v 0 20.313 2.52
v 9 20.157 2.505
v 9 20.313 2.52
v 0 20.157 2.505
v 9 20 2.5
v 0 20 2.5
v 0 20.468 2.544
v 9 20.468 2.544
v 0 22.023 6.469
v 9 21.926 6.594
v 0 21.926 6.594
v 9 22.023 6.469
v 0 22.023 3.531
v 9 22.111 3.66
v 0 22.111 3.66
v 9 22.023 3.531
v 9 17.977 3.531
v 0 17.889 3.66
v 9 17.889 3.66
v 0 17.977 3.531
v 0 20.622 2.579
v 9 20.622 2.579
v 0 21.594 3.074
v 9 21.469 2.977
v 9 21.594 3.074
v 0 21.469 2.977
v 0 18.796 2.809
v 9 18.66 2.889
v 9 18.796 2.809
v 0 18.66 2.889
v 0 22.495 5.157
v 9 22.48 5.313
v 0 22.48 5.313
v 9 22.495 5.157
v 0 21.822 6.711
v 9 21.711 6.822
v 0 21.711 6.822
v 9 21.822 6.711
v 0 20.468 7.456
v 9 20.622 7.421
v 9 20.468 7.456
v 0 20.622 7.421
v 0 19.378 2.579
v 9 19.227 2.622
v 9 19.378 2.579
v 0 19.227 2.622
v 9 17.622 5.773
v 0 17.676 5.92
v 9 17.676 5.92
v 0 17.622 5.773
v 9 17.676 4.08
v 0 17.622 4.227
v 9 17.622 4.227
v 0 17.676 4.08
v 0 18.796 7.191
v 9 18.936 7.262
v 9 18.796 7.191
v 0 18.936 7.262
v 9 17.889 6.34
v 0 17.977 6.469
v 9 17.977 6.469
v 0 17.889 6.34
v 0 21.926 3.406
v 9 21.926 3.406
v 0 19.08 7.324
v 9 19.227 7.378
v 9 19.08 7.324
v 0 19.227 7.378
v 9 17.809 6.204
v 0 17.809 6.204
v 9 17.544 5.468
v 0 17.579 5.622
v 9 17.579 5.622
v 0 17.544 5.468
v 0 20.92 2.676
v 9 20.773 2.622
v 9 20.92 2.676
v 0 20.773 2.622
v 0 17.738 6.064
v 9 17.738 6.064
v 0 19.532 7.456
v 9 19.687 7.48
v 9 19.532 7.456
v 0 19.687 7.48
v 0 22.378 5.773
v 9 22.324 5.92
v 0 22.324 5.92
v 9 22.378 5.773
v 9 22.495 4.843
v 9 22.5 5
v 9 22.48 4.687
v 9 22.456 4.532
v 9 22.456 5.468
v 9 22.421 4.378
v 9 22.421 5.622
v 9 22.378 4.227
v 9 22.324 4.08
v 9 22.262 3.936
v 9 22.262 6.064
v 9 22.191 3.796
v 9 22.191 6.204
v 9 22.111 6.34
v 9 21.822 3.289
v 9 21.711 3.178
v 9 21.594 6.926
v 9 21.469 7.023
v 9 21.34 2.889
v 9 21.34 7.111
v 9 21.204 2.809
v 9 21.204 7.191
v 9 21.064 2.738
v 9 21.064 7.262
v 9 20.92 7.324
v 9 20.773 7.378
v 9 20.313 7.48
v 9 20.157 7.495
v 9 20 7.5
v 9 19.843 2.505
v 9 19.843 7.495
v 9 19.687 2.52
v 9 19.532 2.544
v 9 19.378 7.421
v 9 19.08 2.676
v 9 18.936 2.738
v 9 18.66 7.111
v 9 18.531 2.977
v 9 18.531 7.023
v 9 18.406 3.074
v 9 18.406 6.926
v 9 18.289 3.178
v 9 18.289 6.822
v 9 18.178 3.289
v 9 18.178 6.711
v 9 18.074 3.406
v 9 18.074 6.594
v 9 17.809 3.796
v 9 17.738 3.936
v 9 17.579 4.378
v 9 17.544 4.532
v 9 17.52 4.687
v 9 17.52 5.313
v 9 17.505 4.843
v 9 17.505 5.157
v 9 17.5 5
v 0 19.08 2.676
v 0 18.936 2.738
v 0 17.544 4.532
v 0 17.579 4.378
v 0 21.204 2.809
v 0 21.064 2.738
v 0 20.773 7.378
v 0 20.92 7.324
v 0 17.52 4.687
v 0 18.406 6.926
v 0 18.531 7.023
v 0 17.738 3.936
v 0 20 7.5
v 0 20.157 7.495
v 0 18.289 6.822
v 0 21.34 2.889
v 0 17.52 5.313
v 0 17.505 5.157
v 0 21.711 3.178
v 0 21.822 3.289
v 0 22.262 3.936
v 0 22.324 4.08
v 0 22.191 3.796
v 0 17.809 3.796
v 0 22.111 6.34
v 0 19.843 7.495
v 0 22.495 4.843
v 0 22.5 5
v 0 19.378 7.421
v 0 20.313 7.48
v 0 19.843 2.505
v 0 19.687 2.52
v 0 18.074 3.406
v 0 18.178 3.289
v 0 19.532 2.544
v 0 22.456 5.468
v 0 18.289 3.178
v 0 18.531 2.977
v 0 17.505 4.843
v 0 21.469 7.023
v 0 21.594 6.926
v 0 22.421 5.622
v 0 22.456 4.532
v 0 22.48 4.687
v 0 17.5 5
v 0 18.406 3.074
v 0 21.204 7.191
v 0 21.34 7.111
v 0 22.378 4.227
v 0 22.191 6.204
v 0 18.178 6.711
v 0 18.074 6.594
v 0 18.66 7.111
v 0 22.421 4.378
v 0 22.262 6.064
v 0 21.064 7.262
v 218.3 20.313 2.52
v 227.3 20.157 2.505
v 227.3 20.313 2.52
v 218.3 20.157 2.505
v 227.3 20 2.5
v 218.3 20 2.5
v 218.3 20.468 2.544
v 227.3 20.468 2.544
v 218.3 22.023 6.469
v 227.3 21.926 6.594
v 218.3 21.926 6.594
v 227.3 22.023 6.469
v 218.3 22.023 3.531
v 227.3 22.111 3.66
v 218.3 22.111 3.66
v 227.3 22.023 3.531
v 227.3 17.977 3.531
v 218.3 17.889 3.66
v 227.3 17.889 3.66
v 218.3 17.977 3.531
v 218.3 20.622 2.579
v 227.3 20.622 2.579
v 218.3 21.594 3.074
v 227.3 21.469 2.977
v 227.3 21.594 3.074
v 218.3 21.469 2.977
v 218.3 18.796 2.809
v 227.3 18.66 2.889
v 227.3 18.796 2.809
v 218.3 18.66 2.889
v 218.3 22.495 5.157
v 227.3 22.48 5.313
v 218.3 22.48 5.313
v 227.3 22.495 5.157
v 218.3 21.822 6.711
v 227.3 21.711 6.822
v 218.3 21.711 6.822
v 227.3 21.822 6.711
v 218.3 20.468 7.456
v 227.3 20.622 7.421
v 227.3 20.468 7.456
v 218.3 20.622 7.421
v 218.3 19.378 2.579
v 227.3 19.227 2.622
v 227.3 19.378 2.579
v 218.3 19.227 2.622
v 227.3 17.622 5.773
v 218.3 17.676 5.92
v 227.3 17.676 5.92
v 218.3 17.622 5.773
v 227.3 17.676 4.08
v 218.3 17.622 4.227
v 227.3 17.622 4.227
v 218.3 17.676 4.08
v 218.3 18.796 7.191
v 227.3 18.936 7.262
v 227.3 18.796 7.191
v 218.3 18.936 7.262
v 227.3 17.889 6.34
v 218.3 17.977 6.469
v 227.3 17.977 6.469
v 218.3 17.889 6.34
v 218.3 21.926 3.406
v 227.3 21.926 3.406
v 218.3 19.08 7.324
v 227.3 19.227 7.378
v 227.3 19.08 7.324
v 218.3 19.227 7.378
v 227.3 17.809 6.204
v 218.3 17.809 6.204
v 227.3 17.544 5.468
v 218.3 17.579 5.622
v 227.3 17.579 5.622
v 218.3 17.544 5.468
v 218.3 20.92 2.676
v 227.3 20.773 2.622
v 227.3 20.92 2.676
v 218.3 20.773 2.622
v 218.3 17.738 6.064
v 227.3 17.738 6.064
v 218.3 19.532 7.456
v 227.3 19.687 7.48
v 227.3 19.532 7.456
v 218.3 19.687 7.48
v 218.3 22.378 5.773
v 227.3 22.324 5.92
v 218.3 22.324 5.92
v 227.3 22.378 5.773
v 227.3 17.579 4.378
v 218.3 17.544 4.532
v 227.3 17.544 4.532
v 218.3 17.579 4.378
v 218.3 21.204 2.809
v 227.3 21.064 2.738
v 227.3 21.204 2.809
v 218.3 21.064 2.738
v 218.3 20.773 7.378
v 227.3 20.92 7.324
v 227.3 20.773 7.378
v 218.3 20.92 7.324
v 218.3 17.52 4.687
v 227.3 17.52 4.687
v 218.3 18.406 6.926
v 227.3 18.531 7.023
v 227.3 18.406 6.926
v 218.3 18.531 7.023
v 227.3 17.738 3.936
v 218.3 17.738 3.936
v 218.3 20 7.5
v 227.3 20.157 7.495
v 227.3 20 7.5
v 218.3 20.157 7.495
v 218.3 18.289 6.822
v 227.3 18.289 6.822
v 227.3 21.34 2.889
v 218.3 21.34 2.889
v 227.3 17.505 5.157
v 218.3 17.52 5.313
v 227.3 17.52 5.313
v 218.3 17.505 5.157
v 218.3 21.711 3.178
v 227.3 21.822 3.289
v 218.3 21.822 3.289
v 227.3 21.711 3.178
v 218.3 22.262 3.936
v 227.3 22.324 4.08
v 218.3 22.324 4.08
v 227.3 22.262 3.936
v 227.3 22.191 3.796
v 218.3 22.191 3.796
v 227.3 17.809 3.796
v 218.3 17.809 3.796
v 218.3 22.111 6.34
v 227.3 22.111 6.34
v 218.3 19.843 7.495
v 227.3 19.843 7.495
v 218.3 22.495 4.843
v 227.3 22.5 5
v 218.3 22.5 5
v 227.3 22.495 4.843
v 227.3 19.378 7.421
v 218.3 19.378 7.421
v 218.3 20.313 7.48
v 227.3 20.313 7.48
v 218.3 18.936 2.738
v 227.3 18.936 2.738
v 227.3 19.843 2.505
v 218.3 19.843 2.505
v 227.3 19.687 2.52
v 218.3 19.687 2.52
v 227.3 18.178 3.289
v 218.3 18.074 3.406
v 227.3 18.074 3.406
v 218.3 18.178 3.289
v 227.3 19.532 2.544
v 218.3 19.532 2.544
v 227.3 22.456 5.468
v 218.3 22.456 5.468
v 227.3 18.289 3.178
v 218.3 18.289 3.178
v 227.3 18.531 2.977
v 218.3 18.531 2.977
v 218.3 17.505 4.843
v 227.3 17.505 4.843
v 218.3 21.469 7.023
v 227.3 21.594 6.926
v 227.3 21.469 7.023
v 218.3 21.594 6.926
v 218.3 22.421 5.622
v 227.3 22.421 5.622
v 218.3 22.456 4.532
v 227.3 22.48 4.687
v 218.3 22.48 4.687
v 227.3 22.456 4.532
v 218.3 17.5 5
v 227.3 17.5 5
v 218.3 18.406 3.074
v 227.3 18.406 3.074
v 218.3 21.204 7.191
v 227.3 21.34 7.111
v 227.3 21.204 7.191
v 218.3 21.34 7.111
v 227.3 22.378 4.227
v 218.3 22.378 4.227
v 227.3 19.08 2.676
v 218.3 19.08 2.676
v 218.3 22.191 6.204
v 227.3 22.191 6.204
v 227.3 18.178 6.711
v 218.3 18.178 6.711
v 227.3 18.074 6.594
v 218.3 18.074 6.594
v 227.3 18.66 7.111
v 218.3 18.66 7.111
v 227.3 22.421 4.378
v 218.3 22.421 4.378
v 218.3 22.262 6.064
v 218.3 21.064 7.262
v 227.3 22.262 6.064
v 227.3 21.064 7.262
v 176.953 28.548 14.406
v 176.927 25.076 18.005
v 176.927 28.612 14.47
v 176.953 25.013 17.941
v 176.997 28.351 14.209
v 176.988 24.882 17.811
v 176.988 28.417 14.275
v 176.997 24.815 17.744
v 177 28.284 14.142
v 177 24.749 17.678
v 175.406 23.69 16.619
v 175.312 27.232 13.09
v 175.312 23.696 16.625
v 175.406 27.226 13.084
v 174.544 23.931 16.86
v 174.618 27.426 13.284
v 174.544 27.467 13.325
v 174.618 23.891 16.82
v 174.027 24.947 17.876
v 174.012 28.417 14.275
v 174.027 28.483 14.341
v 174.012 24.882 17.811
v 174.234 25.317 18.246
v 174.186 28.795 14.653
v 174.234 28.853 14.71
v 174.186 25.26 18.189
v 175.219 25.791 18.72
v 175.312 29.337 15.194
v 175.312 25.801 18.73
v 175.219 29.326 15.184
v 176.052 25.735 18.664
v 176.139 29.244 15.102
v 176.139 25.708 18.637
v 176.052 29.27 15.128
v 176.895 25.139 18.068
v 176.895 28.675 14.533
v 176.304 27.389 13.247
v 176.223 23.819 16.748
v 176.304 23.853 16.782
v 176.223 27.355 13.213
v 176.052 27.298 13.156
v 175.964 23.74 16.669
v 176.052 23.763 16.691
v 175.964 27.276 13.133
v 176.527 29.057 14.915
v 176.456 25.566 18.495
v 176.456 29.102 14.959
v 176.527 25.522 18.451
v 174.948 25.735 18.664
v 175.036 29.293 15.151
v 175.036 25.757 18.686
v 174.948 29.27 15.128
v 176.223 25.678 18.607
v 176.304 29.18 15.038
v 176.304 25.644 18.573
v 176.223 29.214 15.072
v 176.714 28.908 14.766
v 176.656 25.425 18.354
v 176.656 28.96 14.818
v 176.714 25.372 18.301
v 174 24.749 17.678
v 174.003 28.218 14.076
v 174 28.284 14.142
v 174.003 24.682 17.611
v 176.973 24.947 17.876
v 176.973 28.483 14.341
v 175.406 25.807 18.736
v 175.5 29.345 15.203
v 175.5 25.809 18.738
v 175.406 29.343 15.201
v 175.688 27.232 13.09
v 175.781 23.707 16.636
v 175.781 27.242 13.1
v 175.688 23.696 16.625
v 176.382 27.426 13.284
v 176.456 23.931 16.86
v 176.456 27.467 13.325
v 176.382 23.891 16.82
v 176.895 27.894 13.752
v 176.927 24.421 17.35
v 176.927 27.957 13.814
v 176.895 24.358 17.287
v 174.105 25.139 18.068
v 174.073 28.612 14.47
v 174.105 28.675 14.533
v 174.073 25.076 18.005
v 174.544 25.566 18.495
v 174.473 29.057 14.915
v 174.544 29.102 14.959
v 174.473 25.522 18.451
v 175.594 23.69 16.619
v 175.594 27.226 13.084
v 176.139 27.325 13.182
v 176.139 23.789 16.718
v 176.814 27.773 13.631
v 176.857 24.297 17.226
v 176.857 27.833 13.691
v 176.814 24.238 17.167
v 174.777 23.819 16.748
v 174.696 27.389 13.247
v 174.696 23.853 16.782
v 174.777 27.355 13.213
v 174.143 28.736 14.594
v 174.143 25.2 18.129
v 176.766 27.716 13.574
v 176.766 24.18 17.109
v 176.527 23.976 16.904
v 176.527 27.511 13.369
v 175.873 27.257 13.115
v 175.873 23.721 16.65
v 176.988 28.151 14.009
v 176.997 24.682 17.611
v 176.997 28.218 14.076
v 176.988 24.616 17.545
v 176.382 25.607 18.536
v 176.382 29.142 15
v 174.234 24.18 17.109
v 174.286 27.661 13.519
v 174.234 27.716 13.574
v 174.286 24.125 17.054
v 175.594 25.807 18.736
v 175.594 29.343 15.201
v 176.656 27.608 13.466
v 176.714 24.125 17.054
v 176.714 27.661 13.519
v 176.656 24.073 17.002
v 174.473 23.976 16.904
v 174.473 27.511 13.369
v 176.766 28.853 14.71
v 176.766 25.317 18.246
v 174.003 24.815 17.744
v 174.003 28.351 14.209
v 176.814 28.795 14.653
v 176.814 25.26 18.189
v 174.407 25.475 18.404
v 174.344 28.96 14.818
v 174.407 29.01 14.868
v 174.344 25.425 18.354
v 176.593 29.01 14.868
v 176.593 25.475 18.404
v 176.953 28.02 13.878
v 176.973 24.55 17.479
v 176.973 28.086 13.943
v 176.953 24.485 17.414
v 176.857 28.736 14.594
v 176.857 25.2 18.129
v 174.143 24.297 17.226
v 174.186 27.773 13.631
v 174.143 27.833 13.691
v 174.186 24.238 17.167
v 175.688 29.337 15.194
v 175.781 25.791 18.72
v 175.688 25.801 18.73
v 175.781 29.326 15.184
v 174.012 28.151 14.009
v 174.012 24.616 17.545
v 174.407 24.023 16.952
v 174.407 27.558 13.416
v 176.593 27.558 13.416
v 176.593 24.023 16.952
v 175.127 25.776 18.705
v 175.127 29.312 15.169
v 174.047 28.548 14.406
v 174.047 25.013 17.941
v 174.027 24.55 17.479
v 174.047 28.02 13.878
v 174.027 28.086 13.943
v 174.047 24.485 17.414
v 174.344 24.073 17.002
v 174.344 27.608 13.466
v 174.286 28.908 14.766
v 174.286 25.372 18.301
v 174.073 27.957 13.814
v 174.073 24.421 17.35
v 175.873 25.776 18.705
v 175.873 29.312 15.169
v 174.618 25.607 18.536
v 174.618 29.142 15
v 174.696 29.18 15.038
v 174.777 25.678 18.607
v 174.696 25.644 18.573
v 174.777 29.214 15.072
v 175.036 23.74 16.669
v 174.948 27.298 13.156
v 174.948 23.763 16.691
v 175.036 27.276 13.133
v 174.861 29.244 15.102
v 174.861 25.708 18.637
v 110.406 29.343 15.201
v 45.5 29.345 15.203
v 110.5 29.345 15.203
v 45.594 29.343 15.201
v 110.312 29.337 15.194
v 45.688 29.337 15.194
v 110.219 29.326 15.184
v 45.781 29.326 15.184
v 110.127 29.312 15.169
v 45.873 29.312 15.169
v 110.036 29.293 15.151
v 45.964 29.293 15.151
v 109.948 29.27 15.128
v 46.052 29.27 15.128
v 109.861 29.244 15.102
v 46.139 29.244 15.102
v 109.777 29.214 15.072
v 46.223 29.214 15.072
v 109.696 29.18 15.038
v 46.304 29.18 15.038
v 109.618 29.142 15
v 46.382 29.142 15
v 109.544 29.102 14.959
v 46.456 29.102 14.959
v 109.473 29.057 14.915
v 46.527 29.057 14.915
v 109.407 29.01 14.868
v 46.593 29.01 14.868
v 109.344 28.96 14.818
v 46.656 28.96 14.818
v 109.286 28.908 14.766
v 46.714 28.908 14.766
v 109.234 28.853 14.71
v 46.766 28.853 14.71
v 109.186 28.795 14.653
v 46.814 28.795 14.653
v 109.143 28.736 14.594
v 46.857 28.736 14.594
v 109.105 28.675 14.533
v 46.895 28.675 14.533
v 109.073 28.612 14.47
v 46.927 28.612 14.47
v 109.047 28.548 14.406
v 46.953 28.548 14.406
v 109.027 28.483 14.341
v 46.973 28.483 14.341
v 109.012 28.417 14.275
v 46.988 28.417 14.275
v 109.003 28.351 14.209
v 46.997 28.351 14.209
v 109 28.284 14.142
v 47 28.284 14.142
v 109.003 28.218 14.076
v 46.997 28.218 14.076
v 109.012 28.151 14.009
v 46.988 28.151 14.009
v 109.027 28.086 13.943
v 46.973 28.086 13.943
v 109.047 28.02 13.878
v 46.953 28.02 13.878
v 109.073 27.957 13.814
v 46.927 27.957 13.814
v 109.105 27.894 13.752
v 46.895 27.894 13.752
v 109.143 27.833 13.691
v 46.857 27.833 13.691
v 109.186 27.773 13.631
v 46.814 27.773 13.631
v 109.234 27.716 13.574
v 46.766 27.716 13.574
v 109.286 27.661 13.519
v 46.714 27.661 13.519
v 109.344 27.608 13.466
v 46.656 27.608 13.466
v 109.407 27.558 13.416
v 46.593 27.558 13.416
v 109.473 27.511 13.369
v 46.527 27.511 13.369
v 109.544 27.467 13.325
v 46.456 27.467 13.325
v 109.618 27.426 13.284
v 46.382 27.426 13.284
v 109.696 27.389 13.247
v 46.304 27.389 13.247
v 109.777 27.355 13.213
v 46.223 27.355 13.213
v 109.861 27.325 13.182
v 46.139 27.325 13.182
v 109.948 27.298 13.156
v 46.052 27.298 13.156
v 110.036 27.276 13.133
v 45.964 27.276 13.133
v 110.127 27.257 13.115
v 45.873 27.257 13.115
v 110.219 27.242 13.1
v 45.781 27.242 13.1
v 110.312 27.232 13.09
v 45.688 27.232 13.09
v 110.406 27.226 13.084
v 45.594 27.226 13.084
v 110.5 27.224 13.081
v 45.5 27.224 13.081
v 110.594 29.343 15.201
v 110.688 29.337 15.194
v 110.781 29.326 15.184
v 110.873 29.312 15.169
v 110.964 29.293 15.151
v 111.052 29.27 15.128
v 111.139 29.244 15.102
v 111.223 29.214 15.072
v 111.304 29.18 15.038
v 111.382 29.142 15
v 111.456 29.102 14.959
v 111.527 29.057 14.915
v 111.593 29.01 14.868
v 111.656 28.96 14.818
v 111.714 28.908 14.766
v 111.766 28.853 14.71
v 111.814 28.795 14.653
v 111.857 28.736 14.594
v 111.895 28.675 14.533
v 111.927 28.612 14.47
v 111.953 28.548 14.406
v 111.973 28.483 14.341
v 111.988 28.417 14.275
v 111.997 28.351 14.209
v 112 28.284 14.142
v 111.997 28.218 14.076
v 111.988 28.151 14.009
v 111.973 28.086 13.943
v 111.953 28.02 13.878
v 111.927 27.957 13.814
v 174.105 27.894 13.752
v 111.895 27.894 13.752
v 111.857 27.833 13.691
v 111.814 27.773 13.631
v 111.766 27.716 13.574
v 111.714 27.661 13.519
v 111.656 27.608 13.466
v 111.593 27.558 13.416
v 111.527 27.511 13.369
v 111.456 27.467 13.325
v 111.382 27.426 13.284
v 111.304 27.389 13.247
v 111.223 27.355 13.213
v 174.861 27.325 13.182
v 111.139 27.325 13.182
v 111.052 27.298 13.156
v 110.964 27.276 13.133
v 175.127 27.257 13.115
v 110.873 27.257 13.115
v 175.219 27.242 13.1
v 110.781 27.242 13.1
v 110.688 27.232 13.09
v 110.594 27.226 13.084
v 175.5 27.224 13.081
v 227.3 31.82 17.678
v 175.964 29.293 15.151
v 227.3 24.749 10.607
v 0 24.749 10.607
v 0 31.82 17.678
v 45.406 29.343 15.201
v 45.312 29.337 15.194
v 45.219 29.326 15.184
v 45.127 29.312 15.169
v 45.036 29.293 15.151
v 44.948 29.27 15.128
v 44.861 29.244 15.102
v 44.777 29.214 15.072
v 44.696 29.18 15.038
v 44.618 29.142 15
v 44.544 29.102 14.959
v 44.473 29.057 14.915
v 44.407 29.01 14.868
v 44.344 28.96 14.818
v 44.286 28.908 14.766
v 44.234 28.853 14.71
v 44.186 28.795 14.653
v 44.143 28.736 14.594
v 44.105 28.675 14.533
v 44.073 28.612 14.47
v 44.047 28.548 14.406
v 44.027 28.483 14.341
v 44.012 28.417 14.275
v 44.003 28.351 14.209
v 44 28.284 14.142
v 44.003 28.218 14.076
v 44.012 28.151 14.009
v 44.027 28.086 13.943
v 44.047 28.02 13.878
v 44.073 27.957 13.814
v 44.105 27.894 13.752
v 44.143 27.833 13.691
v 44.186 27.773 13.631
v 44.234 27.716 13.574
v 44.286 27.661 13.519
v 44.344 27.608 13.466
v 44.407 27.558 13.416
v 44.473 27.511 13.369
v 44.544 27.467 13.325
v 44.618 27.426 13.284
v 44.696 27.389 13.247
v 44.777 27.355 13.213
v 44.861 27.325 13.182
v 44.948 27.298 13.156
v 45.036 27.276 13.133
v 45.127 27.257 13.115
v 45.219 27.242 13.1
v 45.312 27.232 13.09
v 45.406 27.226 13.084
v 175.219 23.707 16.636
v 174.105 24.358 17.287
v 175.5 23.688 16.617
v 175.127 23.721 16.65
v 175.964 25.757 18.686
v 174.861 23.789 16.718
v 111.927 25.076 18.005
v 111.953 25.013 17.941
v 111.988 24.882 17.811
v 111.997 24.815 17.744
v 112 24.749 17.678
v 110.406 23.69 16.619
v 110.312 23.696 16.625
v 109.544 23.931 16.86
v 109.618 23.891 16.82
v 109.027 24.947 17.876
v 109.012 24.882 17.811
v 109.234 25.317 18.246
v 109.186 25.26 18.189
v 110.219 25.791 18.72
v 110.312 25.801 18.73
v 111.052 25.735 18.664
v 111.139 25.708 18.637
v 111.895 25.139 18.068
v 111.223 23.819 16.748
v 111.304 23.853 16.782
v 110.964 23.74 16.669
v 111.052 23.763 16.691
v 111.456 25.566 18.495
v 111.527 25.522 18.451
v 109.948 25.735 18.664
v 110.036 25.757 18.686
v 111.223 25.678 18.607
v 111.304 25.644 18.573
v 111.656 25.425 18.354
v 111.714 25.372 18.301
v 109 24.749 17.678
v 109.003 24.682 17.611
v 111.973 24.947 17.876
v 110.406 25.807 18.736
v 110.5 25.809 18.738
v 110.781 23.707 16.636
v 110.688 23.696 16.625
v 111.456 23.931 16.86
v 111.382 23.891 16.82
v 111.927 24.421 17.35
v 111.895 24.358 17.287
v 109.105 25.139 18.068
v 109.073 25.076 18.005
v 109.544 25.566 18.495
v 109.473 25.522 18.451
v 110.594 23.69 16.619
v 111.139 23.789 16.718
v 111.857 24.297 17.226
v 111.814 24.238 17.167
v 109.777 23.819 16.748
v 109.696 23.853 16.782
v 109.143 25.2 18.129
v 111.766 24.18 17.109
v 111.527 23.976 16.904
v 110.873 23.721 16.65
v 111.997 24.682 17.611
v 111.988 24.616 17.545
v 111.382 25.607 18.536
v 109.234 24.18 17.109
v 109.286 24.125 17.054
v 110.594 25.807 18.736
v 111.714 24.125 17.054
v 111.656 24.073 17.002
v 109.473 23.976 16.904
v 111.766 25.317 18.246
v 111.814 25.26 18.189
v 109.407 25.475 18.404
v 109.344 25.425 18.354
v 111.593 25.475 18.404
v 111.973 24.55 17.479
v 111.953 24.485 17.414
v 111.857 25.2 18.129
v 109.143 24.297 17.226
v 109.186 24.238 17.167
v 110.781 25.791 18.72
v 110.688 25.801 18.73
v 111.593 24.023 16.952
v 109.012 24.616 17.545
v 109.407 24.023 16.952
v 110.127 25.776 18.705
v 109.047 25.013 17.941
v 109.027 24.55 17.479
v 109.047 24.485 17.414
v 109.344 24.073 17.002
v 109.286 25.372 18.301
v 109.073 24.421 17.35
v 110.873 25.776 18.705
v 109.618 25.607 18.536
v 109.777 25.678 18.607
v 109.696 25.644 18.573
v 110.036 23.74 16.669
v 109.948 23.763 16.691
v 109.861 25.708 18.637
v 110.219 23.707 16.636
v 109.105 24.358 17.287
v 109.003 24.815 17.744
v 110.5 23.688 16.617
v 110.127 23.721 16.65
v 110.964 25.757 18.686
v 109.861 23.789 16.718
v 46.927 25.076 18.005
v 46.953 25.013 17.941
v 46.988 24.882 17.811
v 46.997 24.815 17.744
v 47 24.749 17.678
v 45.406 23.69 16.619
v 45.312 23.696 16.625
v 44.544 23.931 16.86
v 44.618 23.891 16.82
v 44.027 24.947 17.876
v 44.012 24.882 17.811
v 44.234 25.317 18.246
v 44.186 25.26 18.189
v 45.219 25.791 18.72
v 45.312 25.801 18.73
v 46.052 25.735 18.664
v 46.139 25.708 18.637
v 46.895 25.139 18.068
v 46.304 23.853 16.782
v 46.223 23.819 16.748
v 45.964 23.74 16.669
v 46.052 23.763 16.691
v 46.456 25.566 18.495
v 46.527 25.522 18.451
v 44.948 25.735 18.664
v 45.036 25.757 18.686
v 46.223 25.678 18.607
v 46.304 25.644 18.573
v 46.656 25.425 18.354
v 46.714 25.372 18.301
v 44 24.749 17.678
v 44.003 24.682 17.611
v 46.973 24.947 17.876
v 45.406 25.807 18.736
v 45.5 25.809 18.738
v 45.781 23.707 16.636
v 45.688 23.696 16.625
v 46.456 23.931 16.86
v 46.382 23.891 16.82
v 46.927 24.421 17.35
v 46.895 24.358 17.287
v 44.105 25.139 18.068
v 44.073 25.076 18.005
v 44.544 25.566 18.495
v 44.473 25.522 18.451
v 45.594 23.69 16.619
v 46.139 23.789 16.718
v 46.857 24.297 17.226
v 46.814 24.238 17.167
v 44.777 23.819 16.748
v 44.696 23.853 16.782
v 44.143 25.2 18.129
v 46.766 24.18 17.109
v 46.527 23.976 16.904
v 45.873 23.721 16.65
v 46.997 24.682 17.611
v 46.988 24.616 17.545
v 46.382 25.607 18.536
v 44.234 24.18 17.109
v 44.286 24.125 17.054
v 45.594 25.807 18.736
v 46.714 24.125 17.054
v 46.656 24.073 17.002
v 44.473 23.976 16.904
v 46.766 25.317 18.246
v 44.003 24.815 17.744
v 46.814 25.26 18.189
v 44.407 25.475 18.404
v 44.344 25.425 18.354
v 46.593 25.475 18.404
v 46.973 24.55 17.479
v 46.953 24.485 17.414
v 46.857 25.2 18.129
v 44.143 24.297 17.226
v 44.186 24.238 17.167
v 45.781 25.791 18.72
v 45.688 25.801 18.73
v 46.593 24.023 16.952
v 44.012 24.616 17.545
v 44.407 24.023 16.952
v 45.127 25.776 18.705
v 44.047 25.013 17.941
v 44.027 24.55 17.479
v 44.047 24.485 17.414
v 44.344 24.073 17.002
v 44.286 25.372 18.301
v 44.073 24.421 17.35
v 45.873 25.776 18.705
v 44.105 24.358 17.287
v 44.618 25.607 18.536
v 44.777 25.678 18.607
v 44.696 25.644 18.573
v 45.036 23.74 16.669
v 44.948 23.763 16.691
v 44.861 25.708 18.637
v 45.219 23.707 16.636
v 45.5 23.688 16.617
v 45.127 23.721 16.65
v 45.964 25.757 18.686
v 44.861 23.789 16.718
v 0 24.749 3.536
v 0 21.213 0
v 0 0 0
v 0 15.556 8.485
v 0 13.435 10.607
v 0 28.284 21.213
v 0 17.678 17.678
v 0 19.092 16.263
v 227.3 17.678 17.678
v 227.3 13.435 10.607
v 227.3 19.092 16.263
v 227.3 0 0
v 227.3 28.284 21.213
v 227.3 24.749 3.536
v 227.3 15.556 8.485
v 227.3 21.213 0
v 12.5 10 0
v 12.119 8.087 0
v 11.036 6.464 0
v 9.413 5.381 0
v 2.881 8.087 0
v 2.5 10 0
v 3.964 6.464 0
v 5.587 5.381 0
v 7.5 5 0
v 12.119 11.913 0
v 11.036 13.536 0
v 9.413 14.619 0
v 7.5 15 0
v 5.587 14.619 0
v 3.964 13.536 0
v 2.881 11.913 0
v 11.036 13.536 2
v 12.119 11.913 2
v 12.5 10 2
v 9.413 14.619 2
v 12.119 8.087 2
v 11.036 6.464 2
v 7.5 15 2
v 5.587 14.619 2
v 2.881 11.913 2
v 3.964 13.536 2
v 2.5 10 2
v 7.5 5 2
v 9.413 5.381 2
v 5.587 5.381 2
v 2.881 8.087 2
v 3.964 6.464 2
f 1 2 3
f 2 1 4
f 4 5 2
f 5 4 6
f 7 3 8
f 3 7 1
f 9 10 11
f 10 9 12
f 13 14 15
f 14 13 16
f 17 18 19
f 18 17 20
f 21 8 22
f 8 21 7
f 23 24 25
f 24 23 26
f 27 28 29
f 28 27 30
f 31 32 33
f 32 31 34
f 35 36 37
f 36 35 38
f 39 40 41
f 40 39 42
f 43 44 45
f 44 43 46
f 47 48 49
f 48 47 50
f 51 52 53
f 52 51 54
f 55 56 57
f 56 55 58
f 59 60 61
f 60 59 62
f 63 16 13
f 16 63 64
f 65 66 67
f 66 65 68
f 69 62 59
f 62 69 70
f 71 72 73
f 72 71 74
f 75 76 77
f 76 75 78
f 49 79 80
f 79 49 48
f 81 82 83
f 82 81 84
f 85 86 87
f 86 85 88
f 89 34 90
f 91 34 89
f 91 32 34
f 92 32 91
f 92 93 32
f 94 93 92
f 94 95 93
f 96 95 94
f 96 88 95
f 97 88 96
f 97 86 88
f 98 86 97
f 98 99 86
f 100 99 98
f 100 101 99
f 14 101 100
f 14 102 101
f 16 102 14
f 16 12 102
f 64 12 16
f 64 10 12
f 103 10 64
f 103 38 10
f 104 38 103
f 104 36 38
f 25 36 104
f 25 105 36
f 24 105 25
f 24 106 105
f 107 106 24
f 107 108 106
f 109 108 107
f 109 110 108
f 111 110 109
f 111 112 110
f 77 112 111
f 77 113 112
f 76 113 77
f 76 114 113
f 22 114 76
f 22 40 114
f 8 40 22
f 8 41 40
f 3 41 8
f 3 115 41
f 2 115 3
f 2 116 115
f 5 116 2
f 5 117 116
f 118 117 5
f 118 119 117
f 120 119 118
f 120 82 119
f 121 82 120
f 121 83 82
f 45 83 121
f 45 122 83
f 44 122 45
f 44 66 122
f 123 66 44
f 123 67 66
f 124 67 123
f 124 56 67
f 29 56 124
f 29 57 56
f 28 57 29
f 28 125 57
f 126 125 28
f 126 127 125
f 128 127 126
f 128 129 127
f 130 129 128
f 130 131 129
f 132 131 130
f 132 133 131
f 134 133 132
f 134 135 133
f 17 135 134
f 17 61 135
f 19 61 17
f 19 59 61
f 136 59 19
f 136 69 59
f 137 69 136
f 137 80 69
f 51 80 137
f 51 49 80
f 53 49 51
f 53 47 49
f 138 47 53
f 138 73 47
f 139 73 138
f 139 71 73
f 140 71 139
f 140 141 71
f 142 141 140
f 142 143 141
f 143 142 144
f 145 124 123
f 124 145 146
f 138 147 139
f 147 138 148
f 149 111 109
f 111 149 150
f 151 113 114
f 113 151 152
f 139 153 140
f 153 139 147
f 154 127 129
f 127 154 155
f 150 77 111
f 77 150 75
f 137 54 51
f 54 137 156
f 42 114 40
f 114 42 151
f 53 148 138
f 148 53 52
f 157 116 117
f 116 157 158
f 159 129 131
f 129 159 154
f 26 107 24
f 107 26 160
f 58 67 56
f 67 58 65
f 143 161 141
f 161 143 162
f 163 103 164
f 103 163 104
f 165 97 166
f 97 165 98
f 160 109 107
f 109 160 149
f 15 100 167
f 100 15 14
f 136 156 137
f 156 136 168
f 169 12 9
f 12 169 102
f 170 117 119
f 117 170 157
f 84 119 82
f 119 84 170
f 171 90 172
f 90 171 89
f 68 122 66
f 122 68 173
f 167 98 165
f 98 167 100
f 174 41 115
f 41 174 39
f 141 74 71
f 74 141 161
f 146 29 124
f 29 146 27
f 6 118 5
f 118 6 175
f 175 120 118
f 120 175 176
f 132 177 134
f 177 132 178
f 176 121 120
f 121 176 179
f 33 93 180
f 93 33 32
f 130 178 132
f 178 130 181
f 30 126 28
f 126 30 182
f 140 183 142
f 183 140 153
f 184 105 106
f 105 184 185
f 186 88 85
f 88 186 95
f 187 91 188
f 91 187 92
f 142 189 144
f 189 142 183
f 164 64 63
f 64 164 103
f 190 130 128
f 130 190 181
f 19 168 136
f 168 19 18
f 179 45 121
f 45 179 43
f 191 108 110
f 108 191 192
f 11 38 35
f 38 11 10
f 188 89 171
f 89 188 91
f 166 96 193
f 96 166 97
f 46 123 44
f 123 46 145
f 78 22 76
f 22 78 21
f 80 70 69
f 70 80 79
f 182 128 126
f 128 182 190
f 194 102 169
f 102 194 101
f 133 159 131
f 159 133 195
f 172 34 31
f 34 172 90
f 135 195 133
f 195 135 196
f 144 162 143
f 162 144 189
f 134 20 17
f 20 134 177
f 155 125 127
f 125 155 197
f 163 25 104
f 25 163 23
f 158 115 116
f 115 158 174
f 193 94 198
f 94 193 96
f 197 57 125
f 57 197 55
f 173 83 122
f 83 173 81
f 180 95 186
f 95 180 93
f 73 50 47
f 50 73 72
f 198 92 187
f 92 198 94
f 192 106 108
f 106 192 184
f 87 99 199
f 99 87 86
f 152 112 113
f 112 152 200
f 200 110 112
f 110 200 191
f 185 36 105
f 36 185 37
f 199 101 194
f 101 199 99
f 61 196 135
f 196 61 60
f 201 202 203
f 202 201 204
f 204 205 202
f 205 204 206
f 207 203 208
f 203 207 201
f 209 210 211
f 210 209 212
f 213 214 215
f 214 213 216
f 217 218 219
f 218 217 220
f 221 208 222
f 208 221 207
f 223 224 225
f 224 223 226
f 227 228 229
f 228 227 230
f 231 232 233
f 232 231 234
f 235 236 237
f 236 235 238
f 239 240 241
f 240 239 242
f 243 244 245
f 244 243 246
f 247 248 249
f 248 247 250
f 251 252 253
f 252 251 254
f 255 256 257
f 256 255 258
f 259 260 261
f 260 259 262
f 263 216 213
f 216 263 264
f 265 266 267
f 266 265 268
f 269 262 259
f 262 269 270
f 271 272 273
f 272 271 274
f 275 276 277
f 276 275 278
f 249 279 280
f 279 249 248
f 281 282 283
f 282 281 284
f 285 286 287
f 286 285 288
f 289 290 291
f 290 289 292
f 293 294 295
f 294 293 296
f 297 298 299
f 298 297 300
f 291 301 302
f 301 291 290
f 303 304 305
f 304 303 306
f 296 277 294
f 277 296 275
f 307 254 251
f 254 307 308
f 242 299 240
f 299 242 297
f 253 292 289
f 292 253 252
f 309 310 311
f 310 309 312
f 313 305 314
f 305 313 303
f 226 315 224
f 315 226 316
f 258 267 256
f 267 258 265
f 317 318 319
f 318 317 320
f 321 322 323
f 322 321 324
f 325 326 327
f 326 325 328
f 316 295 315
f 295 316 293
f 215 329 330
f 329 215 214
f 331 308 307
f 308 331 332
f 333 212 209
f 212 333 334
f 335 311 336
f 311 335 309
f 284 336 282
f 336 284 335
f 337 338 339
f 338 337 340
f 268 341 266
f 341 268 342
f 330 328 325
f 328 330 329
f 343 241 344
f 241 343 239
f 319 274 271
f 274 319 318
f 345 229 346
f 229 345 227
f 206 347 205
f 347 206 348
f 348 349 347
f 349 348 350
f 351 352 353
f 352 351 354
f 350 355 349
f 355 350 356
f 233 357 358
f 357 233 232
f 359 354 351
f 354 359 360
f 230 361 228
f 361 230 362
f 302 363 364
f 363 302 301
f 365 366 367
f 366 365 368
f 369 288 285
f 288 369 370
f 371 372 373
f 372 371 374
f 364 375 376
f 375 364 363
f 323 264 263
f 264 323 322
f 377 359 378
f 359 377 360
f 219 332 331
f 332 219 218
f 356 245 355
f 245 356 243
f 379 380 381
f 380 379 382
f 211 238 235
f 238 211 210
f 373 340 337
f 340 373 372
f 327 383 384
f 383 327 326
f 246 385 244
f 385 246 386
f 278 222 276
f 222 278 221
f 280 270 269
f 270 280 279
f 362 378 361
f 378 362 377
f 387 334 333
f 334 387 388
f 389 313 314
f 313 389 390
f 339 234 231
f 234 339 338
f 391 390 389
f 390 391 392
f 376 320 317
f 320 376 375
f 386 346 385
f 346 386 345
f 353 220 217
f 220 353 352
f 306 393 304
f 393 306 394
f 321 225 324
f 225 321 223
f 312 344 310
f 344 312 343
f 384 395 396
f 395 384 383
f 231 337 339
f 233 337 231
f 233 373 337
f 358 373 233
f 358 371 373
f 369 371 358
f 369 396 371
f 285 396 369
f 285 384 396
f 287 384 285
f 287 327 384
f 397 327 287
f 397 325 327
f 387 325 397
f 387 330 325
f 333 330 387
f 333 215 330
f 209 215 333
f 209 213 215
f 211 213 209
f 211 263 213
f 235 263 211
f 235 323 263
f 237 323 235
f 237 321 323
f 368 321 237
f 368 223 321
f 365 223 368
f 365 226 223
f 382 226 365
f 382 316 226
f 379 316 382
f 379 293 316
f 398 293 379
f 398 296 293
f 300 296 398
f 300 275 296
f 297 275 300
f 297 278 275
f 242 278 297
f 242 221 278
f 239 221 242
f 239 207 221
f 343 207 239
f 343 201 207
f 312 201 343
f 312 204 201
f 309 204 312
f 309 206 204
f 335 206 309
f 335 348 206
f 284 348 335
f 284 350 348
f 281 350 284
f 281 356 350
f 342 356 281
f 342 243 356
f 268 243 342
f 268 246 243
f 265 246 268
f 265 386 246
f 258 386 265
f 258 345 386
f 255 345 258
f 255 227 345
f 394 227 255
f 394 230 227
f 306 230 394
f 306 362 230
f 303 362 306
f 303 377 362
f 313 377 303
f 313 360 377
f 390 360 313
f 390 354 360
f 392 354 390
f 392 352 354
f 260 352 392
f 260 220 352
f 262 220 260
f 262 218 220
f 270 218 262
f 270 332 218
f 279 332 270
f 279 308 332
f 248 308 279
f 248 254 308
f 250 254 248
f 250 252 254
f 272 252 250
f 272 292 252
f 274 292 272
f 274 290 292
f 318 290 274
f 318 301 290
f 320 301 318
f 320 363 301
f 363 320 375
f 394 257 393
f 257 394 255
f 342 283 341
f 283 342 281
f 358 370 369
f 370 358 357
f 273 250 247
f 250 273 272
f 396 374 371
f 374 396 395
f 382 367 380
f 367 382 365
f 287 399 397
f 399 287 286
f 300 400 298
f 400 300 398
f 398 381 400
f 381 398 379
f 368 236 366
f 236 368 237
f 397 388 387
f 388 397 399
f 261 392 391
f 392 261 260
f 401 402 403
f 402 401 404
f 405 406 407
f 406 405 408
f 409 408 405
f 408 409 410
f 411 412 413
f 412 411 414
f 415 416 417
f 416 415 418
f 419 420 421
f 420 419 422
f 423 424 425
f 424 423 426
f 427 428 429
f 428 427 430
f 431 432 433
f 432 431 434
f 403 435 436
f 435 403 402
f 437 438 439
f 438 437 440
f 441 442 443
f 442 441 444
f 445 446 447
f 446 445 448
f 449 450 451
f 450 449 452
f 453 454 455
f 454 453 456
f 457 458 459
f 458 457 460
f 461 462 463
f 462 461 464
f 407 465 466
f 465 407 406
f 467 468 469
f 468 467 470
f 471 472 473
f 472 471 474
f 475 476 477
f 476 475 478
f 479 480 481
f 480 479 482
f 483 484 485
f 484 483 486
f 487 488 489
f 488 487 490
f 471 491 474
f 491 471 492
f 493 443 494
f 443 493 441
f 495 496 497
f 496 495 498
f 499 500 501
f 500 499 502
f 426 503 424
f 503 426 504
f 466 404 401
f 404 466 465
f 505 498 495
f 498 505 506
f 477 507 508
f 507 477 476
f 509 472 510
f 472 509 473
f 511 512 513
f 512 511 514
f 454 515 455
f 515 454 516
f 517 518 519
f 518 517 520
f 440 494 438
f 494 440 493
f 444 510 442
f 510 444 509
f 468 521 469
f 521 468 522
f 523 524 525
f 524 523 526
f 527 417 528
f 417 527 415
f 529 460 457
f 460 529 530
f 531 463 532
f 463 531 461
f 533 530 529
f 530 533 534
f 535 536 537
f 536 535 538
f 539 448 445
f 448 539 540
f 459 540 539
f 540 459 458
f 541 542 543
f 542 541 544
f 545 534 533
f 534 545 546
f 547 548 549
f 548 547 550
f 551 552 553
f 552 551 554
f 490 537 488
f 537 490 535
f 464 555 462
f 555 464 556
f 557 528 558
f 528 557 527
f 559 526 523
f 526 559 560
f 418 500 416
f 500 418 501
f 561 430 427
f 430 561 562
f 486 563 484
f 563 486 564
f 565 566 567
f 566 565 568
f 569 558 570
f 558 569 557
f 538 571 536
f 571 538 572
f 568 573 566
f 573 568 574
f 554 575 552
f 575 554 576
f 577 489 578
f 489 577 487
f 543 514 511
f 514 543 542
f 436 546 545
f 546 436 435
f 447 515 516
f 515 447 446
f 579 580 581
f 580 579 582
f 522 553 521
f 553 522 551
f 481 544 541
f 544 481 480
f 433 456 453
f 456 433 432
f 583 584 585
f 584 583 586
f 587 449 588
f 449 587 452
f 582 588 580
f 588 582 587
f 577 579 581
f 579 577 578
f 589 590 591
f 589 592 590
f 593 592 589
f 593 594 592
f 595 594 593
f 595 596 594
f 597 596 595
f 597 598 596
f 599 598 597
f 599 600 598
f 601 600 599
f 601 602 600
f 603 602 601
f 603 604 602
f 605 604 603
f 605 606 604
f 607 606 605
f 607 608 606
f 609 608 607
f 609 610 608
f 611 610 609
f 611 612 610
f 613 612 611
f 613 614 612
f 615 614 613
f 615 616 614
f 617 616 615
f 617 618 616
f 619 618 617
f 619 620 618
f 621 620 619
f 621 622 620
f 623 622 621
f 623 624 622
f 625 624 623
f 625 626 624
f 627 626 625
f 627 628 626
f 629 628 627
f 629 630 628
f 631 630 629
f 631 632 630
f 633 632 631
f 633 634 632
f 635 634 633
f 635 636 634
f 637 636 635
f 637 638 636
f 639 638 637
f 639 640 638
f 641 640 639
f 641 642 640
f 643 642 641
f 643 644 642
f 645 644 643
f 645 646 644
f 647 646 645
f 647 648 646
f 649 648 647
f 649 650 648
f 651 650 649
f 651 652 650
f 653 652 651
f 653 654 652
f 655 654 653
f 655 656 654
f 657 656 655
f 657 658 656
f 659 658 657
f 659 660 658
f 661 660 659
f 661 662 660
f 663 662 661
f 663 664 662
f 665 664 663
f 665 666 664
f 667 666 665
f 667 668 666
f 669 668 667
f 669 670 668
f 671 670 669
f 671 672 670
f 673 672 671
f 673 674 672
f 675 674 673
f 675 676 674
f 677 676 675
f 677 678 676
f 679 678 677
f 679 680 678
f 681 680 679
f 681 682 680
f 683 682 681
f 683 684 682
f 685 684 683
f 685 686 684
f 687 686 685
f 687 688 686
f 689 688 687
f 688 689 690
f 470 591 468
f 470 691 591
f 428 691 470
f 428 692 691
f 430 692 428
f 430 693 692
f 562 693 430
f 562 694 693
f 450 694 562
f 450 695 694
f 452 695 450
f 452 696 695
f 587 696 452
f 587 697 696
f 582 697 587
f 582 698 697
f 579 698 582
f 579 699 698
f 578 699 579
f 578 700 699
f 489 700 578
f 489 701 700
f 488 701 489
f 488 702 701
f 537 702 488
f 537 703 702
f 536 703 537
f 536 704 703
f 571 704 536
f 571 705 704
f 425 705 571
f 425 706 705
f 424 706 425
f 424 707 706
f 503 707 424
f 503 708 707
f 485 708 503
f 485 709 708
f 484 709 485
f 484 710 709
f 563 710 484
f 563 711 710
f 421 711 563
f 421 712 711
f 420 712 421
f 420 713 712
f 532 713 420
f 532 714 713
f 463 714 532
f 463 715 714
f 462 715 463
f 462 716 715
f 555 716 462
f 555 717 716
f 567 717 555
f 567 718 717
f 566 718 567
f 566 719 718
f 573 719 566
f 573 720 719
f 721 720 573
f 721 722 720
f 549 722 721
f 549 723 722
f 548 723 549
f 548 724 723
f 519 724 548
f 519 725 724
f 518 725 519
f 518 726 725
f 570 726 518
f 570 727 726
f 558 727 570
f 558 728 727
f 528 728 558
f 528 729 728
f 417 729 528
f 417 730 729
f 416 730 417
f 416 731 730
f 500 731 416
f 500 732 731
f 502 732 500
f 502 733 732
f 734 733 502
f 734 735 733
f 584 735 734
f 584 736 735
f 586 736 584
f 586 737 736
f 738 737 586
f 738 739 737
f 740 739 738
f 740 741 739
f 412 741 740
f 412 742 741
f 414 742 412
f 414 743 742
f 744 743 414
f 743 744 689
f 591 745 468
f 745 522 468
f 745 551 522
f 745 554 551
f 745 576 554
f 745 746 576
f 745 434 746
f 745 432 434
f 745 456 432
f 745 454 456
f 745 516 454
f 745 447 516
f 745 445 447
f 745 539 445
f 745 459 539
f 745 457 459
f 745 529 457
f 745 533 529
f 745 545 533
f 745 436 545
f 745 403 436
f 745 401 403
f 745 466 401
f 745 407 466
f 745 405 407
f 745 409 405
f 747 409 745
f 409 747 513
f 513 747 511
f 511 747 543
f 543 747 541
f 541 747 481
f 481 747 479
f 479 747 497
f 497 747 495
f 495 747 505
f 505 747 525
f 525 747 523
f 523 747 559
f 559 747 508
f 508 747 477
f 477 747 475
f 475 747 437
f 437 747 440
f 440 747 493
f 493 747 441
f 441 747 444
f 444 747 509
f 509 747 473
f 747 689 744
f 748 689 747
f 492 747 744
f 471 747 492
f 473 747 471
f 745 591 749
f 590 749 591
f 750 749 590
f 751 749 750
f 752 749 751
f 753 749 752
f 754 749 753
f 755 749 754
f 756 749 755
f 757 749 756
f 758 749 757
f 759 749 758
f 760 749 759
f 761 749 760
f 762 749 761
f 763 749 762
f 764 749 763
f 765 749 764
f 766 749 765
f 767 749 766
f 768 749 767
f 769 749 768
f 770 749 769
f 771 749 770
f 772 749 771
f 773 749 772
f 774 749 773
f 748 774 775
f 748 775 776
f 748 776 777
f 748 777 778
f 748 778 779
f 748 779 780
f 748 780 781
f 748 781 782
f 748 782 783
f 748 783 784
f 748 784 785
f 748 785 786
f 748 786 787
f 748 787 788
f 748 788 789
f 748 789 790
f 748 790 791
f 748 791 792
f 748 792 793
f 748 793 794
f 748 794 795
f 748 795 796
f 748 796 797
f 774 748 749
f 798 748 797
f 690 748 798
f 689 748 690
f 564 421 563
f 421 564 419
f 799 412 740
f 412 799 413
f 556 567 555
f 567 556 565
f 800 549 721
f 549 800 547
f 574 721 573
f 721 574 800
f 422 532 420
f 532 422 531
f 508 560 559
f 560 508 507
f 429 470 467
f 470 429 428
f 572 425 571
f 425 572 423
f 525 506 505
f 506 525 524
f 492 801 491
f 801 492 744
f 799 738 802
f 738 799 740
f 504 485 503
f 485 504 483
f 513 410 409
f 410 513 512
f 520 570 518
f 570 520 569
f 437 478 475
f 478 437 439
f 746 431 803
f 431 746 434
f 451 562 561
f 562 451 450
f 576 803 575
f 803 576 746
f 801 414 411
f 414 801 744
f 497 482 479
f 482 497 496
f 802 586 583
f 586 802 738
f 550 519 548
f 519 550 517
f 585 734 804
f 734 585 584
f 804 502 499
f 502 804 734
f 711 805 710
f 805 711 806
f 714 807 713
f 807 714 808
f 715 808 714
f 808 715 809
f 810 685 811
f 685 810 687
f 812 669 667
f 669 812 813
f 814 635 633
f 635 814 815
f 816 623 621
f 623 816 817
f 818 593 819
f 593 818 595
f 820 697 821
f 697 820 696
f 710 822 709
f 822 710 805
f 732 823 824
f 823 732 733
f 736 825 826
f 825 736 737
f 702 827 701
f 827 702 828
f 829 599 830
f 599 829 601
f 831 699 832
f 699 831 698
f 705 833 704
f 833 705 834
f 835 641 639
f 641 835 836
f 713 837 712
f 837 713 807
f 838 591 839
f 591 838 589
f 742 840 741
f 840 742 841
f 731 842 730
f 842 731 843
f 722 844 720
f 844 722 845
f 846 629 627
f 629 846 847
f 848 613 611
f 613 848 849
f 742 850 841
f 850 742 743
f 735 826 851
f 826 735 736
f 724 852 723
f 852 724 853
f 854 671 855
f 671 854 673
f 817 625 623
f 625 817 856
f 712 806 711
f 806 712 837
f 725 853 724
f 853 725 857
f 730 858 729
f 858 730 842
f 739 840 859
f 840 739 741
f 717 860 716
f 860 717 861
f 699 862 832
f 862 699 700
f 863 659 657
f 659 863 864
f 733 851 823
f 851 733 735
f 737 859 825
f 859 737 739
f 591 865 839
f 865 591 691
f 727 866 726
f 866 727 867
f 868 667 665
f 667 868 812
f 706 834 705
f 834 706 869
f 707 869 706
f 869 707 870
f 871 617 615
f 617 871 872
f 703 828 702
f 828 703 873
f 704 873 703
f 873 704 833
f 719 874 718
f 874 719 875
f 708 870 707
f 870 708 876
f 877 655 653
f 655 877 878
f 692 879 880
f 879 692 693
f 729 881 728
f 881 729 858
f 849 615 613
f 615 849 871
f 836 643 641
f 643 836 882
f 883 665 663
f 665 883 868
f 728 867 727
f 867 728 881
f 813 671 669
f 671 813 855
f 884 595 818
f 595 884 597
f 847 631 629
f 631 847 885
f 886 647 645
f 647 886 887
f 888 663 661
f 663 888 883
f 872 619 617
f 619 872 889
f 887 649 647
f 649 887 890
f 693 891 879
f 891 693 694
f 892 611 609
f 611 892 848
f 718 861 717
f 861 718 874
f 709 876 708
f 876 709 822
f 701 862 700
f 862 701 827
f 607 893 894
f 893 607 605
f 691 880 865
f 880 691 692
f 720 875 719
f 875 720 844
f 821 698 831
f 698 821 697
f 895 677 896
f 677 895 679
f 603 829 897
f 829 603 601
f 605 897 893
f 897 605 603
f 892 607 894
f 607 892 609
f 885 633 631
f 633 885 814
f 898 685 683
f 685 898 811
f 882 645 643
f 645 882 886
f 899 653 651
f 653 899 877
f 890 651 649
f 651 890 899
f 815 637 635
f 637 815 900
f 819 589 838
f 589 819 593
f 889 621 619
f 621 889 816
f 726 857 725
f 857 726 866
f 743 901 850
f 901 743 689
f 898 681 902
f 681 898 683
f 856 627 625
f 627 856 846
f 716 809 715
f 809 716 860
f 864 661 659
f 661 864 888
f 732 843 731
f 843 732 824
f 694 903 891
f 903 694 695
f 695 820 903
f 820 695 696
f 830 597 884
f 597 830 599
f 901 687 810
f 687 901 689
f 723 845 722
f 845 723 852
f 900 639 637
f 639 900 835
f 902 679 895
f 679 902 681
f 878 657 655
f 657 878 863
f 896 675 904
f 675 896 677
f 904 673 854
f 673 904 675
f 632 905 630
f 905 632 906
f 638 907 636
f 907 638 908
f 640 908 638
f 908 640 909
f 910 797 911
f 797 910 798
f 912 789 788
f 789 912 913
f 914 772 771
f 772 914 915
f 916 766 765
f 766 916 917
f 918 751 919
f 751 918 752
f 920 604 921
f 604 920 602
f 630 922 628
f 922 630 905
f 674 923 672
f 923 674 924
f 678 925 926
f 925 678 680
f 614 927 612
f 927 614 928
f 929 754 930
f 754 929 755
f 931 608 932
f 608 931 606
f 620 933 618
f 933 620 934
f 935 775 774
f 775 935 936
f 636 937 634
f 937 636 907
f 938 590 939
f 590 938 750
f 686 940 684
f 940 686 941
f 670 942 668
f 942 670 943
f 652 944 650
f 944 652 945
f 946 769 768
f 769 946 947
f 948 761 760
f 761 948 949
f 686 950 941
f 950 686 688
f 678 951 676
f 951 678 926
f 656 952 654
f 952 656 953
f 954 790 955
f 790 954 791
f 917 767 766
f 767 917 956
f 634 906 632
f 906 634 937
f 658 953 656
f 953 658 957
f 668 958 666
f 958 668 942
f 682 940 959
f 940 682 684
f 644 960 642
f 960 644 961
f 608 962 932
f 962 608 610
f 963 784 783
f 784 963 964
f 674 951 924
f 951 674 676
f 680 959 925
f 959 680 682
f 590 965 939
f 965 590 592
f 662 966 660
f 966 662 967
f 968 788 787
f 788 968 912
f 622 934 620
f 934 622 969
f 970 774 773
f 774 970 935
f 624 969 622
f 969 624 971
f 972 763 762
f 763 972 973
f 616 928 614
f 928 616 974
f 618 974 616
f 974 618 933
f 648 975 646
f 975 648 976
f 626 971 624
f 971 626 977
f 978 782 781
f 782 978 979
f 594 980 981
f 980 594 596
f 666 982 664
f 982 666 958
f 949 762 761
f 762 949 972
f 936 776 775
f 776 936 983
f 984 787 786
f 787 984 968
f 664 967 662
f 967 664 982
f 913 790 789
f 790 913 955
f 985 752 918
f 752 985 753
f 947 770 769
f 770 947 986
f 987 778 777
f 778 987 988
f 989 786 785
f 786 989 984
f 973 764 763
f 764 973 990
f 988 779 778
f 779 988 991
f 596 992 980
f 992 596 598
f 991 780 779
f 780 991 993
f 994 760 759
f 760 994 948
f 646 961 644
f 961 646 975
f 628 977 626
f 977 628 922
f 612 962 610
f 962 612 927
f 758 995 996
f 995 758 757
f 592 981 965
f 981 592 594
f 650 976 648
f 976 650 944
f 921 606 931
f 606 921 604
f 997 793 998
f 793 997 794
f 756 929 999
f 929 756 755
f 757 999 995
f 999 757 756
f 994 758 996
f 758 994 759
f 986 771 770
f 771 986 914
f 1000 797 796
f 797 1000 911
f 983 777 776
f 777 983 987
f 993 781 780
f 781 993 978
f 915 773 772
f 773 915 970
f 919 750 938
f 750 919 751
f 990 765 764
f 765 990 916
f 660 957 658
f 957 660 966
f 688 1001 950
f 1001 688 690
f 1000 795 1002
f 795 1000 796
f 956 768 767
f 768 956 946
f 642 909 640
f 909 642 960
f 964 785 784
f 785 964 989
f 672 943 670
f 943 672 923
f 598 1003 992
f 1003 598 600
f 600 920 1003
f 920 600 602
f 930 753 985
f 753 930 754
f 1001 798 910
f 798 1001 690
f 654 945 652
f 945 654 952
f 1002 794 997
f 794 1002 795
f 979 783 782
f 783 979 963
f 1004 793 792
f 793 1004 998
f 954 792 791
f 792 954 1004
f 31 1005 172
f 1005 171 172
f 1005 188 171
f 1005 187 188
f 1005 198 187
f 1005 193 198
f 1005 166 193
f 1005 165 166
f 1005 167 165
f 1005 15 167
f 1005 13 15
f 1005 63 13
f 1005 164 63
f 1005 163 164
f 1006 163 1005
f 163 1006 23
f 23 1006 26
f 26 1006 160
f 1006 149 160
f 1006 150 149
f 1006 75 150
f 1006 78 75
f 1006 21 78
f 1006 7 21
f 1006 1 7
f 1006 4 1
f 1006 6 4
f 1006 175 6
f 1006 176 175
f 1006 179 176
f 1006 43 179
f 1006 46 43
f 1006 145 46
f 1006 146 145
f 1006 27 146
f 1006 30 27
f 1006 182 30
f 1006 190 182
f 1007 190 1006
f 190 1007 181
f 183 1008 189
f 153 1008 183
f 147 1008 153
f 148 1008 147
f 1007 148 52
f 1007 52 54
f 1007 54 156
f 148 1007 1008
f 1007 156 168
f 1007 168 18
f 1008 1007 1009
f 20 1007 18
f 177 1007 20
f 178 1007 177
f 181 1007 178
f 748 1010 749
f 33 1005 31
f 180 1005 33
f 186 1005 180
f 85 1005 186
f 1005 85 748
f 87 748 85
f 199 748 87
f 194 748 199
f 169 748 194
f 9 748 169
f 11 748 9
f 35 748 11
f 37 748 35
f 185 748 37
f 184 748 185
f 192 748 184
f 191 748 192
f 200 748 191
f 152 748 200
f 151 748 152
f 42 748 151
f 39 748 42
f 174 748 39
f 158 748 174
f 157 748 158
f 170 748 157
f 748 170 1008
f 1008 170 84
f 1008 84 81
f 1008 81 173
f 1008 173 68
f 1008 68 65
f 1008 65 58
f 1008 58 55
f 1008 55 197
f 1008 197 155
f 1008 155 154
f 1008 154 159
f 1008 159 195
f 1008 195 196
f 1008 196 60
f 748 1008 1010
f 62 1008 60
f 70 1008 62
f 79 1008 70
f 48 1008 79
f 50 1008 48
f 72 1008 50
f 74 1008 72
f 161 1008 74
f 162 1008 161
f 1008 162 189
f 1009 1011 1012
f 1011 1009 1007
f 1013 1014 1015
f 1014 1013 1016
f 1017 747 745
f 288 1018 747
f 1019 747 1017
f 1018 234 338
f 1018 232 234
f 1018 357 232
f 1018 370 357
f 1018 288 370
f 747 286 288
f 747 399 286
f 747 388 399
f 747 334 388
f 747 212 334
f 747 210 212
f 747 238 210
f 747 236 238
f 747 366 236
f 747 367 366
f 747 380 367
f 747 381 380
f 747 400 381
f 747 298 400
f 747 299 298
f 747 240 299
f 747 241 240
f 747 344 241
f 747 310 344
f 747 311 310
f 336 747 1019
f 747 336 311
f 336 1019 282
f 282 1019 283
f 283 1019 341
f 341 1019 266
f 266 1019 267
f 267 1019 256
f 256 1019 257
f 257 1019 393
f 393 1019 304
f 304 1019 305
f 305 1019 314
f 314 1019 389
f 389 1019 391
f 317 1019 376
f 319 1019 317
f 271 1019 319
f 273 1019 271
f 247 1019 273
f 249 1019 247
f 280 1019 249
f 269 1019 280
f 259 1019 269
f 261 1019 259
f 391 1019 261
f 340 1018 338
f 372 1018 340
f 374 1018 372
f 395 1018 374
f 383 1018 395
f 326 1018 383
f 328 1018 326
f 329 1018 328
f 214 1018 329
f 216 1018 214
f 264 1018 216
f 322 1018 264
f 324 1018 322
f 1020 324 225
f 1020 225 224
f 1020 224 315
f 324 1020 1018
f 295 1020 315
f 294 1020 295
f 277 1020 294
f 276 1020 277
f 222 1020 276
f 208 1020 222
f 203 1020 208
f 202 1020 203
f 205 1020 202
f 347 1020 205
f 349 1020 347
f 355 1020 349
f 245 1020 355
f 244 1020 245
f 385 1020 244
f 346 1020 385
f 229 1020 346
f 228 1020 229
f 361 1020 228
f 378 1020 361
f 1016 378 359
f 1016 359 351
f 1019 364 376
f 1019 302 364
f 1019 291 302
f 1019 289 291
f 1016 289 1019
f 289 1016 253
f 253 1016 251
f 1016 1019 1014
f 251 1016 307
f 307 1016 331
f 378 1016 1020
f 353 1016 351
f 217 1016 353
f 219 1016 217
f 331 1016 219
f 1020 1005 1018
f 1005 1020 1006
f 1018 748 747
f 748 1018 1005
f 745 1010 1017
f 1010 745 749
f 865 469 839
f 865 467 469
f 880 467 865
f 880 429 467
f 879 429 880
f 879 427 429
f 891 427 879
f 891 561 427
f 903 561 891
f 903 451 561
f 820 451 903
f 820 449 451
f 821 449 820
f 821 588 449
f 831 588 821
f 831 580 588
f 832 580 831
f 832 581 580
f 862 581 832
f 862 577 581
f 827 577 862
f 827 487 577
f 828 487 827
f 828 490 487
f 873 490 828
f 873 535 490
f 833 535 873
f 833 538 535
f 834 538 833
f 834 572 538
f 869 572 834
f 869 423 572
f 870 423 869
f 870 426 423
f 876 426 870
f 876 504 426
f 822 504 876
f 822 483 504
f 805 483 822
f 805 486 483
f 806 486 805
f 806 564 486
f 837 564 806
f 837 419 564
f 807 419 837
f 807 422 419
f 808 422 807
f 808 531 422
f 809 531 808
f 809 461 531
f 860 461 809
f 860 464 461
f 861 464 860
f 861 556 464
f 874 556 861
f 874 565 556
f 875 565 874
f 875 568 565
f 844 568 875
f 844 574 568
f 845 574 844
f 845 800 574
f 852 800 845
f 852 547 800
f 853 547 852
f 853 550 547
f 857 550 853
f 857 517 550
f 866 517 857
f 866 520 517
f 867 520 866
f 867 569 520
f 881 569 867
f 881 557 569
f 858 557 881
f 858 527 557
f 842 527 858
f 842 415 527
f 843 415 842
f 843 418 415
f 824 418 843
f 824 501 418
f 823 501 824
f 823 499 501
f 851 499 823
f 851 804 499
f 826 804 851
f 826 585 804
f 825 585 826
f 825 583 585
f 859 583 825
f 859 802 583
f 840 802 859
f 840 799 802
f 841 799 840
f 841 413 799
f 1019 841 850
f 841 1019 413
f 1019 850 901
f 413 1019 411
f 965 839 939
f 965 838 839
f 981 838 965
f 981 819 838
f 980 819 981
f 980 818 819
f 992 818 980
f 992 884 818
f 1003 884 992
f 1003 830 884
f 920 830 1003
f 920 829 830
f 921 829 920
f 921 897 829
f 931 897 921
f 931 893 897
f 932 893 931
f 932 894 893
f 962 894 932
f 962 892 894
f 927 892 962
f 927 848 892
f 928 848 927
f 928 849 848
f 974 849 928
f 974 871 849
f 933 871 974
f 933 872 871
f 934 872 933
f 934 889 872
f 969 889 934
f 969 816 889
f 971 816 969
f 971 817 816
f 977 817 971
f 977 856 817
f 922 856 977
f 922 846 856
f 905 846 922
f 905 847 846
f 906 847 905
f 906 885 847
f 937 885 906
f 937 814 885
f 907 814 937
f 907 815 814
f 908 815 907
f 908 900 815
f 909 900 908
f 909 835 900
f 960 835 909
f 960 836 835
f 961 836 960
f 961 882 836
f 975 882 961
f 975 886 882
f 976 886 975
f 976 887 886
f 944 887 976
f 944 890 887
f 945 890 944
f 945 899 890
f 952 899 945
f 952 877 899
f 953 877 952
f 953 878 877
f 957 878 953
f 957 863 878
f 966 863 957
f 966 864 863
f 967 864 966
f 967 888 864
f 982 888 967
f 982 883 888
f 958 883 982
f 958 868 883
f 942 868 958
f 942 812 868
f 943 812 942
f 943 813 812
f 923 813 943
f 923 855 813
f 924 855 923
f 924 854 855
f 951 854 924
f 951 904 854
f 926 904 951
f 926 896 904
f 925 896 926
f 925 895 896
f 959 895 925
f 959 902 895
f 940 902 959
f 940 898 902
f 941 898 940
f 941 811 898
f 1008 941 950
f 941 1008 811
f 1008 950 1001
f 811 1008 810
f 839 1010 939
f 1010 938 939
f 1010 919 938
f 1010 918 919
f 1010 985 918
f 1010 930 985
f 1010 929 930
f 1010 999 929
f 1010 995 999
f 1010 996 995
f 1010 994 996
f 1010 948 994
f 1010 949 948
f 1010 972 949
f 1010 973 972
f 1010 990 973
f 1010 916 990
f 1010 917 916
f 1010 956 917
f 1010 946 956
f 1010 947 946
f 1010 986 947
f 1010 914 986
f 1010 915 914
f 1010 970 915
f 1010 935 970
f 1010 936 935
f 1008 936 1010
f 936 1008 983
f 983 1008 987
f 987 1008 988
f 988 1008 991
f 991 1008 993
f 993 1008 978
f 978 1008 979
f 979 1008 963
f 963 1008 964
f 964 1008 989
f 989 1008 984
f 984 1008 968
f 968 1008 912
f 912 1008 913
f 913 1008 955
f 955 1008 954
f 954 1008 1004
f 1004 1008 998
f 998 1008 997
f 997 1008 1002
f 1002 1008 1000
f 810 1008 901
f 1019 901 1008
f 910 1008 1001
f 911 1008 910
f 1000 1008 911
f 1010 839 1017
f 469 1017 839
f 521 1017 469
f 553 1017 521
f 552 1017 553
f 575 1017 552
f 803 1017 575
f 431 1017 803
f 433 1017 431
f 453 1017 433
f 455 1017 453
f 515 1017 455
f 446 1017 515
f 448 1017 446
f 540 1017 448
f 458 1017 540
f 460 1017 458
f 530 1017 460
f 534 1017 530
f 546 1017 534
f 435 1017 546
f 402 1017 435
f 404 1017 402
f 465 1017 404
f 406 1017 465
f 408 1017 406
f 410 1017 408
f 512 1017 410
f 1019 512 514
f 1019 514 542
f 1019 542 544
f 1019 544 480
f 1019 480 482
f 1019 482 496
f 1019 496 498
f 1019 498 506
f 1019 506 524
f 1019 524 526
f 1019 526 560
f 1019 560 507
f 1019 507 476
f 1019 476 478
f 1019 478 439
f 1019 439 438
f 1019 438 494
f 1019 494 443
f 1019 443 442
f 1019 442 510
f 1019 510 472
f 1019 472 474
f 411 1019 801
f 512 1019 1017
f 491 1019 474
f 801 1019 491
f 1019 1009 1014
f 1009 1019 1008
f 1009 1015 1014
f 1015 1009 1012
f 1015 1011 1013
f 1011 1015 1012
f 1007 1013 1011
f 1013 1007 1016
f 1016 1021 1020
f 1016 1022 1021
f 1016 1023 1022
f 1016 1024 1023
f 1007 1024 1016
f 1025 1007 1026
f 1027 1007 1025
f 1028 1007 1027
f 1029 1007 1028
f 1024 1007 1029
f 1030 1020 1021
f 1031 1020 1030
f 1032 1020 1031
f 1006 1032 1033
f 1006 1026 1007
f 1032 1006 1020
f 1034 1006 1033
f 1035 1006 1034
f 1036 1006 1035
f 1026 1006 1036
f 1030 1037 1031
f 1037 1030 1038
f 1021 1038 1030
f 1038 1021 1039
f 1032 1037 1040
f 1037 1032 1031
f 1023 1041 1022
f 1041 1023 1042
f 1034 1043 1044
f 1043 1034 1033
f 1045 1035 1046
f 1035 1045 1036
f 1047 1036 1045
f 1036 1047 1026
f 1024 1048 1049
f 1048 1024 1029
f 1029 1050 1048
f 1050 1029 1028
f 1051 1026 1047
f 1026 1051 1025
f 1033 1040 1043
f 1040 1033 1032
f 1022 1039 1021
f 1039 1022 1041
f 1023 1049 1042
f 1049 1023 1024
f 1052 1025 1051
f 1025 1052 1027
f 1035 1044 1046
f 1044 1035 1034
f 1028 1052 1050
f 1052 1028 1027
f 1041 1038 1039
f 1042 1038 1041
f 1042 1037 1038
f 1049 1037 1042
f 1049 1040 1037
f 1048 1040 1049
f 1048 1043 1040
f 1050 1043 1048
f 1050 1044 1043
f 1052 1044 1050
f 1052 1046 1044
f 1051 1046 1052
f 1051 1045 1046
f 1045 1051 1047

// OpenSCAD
module e_profile() {
    polygon(
    [[ 0,  0],
     [ 0, 25],
     [ 2, 25],
     [ 2, 17],
     [ 5, 17],
     [ 5, 35],
     [10, 35],
     [10, 25],
     [15, 20],
     [15, 15]
    ]);
}
module body(length) {
rotate([45, 0, 0])
    rotate([0,90,0])
        linear_extrude(length)
            e_profile();
}
length                 = 221;
top                    = true;
long                   = length > 180;
distance_between_holes = 65;
shift                  = 6.3;
echo (top, long, length);

difference() {
    body(length + shift);
    if (long) {
        // magnet hole
        if (top){
            translate([7.5, 10, -2])
                #cylinder(4, d=10);
        } else {
            translate([-5, 20, -9])
                #cylinder(4, d=10);
        }
    } else {
        if (top) {
            // substract lock
            echo ("left top lock");
            translate([length - 25 + shift, sqrt(2) * 5, 0])
                rotate([45, 0, 0])
            translate([0, -sqrt(2) * 5, -20])
                rotate([0, 45, 0])
                    #cube(40);
        } else {
            // add lock
            echo ("left bottom lock");
            translate([-28.3, sqrt(2) * 5, 0])
                rotate([45, 0, 0])
            translate([0, -sqrt(2) * 5, -23.32])
                rotate([0, 45, 0])
                    #cube(40);
        }
    }
    rotate([0, 90, 0]){
        // 
        if (top) {
            translate([-5, 20, -9])
                #cylinder(18, d=5, $fn=100);
        } 
        if (top || long)
        {        
            translate([-5, 20, -9 + length + shift])
                #cylinder(18, d=5, $fn=100);
        }
    }
    screwCount = ceil((length - distance_between_holes  / 2) / distance_between_holes);
    initial    = (-length - ((screwCount - 1) * distance_between_holes)) / 2;
    for(screwx = [0 : 1 : screwCount - 1]) {
        rotate ([45, 0, 0]) {
            translate([-initial + screwx * -distance_between_holes, 30, -10])
                cylinder(h=10, d=3, $fn = 100);
        }
    }
}
